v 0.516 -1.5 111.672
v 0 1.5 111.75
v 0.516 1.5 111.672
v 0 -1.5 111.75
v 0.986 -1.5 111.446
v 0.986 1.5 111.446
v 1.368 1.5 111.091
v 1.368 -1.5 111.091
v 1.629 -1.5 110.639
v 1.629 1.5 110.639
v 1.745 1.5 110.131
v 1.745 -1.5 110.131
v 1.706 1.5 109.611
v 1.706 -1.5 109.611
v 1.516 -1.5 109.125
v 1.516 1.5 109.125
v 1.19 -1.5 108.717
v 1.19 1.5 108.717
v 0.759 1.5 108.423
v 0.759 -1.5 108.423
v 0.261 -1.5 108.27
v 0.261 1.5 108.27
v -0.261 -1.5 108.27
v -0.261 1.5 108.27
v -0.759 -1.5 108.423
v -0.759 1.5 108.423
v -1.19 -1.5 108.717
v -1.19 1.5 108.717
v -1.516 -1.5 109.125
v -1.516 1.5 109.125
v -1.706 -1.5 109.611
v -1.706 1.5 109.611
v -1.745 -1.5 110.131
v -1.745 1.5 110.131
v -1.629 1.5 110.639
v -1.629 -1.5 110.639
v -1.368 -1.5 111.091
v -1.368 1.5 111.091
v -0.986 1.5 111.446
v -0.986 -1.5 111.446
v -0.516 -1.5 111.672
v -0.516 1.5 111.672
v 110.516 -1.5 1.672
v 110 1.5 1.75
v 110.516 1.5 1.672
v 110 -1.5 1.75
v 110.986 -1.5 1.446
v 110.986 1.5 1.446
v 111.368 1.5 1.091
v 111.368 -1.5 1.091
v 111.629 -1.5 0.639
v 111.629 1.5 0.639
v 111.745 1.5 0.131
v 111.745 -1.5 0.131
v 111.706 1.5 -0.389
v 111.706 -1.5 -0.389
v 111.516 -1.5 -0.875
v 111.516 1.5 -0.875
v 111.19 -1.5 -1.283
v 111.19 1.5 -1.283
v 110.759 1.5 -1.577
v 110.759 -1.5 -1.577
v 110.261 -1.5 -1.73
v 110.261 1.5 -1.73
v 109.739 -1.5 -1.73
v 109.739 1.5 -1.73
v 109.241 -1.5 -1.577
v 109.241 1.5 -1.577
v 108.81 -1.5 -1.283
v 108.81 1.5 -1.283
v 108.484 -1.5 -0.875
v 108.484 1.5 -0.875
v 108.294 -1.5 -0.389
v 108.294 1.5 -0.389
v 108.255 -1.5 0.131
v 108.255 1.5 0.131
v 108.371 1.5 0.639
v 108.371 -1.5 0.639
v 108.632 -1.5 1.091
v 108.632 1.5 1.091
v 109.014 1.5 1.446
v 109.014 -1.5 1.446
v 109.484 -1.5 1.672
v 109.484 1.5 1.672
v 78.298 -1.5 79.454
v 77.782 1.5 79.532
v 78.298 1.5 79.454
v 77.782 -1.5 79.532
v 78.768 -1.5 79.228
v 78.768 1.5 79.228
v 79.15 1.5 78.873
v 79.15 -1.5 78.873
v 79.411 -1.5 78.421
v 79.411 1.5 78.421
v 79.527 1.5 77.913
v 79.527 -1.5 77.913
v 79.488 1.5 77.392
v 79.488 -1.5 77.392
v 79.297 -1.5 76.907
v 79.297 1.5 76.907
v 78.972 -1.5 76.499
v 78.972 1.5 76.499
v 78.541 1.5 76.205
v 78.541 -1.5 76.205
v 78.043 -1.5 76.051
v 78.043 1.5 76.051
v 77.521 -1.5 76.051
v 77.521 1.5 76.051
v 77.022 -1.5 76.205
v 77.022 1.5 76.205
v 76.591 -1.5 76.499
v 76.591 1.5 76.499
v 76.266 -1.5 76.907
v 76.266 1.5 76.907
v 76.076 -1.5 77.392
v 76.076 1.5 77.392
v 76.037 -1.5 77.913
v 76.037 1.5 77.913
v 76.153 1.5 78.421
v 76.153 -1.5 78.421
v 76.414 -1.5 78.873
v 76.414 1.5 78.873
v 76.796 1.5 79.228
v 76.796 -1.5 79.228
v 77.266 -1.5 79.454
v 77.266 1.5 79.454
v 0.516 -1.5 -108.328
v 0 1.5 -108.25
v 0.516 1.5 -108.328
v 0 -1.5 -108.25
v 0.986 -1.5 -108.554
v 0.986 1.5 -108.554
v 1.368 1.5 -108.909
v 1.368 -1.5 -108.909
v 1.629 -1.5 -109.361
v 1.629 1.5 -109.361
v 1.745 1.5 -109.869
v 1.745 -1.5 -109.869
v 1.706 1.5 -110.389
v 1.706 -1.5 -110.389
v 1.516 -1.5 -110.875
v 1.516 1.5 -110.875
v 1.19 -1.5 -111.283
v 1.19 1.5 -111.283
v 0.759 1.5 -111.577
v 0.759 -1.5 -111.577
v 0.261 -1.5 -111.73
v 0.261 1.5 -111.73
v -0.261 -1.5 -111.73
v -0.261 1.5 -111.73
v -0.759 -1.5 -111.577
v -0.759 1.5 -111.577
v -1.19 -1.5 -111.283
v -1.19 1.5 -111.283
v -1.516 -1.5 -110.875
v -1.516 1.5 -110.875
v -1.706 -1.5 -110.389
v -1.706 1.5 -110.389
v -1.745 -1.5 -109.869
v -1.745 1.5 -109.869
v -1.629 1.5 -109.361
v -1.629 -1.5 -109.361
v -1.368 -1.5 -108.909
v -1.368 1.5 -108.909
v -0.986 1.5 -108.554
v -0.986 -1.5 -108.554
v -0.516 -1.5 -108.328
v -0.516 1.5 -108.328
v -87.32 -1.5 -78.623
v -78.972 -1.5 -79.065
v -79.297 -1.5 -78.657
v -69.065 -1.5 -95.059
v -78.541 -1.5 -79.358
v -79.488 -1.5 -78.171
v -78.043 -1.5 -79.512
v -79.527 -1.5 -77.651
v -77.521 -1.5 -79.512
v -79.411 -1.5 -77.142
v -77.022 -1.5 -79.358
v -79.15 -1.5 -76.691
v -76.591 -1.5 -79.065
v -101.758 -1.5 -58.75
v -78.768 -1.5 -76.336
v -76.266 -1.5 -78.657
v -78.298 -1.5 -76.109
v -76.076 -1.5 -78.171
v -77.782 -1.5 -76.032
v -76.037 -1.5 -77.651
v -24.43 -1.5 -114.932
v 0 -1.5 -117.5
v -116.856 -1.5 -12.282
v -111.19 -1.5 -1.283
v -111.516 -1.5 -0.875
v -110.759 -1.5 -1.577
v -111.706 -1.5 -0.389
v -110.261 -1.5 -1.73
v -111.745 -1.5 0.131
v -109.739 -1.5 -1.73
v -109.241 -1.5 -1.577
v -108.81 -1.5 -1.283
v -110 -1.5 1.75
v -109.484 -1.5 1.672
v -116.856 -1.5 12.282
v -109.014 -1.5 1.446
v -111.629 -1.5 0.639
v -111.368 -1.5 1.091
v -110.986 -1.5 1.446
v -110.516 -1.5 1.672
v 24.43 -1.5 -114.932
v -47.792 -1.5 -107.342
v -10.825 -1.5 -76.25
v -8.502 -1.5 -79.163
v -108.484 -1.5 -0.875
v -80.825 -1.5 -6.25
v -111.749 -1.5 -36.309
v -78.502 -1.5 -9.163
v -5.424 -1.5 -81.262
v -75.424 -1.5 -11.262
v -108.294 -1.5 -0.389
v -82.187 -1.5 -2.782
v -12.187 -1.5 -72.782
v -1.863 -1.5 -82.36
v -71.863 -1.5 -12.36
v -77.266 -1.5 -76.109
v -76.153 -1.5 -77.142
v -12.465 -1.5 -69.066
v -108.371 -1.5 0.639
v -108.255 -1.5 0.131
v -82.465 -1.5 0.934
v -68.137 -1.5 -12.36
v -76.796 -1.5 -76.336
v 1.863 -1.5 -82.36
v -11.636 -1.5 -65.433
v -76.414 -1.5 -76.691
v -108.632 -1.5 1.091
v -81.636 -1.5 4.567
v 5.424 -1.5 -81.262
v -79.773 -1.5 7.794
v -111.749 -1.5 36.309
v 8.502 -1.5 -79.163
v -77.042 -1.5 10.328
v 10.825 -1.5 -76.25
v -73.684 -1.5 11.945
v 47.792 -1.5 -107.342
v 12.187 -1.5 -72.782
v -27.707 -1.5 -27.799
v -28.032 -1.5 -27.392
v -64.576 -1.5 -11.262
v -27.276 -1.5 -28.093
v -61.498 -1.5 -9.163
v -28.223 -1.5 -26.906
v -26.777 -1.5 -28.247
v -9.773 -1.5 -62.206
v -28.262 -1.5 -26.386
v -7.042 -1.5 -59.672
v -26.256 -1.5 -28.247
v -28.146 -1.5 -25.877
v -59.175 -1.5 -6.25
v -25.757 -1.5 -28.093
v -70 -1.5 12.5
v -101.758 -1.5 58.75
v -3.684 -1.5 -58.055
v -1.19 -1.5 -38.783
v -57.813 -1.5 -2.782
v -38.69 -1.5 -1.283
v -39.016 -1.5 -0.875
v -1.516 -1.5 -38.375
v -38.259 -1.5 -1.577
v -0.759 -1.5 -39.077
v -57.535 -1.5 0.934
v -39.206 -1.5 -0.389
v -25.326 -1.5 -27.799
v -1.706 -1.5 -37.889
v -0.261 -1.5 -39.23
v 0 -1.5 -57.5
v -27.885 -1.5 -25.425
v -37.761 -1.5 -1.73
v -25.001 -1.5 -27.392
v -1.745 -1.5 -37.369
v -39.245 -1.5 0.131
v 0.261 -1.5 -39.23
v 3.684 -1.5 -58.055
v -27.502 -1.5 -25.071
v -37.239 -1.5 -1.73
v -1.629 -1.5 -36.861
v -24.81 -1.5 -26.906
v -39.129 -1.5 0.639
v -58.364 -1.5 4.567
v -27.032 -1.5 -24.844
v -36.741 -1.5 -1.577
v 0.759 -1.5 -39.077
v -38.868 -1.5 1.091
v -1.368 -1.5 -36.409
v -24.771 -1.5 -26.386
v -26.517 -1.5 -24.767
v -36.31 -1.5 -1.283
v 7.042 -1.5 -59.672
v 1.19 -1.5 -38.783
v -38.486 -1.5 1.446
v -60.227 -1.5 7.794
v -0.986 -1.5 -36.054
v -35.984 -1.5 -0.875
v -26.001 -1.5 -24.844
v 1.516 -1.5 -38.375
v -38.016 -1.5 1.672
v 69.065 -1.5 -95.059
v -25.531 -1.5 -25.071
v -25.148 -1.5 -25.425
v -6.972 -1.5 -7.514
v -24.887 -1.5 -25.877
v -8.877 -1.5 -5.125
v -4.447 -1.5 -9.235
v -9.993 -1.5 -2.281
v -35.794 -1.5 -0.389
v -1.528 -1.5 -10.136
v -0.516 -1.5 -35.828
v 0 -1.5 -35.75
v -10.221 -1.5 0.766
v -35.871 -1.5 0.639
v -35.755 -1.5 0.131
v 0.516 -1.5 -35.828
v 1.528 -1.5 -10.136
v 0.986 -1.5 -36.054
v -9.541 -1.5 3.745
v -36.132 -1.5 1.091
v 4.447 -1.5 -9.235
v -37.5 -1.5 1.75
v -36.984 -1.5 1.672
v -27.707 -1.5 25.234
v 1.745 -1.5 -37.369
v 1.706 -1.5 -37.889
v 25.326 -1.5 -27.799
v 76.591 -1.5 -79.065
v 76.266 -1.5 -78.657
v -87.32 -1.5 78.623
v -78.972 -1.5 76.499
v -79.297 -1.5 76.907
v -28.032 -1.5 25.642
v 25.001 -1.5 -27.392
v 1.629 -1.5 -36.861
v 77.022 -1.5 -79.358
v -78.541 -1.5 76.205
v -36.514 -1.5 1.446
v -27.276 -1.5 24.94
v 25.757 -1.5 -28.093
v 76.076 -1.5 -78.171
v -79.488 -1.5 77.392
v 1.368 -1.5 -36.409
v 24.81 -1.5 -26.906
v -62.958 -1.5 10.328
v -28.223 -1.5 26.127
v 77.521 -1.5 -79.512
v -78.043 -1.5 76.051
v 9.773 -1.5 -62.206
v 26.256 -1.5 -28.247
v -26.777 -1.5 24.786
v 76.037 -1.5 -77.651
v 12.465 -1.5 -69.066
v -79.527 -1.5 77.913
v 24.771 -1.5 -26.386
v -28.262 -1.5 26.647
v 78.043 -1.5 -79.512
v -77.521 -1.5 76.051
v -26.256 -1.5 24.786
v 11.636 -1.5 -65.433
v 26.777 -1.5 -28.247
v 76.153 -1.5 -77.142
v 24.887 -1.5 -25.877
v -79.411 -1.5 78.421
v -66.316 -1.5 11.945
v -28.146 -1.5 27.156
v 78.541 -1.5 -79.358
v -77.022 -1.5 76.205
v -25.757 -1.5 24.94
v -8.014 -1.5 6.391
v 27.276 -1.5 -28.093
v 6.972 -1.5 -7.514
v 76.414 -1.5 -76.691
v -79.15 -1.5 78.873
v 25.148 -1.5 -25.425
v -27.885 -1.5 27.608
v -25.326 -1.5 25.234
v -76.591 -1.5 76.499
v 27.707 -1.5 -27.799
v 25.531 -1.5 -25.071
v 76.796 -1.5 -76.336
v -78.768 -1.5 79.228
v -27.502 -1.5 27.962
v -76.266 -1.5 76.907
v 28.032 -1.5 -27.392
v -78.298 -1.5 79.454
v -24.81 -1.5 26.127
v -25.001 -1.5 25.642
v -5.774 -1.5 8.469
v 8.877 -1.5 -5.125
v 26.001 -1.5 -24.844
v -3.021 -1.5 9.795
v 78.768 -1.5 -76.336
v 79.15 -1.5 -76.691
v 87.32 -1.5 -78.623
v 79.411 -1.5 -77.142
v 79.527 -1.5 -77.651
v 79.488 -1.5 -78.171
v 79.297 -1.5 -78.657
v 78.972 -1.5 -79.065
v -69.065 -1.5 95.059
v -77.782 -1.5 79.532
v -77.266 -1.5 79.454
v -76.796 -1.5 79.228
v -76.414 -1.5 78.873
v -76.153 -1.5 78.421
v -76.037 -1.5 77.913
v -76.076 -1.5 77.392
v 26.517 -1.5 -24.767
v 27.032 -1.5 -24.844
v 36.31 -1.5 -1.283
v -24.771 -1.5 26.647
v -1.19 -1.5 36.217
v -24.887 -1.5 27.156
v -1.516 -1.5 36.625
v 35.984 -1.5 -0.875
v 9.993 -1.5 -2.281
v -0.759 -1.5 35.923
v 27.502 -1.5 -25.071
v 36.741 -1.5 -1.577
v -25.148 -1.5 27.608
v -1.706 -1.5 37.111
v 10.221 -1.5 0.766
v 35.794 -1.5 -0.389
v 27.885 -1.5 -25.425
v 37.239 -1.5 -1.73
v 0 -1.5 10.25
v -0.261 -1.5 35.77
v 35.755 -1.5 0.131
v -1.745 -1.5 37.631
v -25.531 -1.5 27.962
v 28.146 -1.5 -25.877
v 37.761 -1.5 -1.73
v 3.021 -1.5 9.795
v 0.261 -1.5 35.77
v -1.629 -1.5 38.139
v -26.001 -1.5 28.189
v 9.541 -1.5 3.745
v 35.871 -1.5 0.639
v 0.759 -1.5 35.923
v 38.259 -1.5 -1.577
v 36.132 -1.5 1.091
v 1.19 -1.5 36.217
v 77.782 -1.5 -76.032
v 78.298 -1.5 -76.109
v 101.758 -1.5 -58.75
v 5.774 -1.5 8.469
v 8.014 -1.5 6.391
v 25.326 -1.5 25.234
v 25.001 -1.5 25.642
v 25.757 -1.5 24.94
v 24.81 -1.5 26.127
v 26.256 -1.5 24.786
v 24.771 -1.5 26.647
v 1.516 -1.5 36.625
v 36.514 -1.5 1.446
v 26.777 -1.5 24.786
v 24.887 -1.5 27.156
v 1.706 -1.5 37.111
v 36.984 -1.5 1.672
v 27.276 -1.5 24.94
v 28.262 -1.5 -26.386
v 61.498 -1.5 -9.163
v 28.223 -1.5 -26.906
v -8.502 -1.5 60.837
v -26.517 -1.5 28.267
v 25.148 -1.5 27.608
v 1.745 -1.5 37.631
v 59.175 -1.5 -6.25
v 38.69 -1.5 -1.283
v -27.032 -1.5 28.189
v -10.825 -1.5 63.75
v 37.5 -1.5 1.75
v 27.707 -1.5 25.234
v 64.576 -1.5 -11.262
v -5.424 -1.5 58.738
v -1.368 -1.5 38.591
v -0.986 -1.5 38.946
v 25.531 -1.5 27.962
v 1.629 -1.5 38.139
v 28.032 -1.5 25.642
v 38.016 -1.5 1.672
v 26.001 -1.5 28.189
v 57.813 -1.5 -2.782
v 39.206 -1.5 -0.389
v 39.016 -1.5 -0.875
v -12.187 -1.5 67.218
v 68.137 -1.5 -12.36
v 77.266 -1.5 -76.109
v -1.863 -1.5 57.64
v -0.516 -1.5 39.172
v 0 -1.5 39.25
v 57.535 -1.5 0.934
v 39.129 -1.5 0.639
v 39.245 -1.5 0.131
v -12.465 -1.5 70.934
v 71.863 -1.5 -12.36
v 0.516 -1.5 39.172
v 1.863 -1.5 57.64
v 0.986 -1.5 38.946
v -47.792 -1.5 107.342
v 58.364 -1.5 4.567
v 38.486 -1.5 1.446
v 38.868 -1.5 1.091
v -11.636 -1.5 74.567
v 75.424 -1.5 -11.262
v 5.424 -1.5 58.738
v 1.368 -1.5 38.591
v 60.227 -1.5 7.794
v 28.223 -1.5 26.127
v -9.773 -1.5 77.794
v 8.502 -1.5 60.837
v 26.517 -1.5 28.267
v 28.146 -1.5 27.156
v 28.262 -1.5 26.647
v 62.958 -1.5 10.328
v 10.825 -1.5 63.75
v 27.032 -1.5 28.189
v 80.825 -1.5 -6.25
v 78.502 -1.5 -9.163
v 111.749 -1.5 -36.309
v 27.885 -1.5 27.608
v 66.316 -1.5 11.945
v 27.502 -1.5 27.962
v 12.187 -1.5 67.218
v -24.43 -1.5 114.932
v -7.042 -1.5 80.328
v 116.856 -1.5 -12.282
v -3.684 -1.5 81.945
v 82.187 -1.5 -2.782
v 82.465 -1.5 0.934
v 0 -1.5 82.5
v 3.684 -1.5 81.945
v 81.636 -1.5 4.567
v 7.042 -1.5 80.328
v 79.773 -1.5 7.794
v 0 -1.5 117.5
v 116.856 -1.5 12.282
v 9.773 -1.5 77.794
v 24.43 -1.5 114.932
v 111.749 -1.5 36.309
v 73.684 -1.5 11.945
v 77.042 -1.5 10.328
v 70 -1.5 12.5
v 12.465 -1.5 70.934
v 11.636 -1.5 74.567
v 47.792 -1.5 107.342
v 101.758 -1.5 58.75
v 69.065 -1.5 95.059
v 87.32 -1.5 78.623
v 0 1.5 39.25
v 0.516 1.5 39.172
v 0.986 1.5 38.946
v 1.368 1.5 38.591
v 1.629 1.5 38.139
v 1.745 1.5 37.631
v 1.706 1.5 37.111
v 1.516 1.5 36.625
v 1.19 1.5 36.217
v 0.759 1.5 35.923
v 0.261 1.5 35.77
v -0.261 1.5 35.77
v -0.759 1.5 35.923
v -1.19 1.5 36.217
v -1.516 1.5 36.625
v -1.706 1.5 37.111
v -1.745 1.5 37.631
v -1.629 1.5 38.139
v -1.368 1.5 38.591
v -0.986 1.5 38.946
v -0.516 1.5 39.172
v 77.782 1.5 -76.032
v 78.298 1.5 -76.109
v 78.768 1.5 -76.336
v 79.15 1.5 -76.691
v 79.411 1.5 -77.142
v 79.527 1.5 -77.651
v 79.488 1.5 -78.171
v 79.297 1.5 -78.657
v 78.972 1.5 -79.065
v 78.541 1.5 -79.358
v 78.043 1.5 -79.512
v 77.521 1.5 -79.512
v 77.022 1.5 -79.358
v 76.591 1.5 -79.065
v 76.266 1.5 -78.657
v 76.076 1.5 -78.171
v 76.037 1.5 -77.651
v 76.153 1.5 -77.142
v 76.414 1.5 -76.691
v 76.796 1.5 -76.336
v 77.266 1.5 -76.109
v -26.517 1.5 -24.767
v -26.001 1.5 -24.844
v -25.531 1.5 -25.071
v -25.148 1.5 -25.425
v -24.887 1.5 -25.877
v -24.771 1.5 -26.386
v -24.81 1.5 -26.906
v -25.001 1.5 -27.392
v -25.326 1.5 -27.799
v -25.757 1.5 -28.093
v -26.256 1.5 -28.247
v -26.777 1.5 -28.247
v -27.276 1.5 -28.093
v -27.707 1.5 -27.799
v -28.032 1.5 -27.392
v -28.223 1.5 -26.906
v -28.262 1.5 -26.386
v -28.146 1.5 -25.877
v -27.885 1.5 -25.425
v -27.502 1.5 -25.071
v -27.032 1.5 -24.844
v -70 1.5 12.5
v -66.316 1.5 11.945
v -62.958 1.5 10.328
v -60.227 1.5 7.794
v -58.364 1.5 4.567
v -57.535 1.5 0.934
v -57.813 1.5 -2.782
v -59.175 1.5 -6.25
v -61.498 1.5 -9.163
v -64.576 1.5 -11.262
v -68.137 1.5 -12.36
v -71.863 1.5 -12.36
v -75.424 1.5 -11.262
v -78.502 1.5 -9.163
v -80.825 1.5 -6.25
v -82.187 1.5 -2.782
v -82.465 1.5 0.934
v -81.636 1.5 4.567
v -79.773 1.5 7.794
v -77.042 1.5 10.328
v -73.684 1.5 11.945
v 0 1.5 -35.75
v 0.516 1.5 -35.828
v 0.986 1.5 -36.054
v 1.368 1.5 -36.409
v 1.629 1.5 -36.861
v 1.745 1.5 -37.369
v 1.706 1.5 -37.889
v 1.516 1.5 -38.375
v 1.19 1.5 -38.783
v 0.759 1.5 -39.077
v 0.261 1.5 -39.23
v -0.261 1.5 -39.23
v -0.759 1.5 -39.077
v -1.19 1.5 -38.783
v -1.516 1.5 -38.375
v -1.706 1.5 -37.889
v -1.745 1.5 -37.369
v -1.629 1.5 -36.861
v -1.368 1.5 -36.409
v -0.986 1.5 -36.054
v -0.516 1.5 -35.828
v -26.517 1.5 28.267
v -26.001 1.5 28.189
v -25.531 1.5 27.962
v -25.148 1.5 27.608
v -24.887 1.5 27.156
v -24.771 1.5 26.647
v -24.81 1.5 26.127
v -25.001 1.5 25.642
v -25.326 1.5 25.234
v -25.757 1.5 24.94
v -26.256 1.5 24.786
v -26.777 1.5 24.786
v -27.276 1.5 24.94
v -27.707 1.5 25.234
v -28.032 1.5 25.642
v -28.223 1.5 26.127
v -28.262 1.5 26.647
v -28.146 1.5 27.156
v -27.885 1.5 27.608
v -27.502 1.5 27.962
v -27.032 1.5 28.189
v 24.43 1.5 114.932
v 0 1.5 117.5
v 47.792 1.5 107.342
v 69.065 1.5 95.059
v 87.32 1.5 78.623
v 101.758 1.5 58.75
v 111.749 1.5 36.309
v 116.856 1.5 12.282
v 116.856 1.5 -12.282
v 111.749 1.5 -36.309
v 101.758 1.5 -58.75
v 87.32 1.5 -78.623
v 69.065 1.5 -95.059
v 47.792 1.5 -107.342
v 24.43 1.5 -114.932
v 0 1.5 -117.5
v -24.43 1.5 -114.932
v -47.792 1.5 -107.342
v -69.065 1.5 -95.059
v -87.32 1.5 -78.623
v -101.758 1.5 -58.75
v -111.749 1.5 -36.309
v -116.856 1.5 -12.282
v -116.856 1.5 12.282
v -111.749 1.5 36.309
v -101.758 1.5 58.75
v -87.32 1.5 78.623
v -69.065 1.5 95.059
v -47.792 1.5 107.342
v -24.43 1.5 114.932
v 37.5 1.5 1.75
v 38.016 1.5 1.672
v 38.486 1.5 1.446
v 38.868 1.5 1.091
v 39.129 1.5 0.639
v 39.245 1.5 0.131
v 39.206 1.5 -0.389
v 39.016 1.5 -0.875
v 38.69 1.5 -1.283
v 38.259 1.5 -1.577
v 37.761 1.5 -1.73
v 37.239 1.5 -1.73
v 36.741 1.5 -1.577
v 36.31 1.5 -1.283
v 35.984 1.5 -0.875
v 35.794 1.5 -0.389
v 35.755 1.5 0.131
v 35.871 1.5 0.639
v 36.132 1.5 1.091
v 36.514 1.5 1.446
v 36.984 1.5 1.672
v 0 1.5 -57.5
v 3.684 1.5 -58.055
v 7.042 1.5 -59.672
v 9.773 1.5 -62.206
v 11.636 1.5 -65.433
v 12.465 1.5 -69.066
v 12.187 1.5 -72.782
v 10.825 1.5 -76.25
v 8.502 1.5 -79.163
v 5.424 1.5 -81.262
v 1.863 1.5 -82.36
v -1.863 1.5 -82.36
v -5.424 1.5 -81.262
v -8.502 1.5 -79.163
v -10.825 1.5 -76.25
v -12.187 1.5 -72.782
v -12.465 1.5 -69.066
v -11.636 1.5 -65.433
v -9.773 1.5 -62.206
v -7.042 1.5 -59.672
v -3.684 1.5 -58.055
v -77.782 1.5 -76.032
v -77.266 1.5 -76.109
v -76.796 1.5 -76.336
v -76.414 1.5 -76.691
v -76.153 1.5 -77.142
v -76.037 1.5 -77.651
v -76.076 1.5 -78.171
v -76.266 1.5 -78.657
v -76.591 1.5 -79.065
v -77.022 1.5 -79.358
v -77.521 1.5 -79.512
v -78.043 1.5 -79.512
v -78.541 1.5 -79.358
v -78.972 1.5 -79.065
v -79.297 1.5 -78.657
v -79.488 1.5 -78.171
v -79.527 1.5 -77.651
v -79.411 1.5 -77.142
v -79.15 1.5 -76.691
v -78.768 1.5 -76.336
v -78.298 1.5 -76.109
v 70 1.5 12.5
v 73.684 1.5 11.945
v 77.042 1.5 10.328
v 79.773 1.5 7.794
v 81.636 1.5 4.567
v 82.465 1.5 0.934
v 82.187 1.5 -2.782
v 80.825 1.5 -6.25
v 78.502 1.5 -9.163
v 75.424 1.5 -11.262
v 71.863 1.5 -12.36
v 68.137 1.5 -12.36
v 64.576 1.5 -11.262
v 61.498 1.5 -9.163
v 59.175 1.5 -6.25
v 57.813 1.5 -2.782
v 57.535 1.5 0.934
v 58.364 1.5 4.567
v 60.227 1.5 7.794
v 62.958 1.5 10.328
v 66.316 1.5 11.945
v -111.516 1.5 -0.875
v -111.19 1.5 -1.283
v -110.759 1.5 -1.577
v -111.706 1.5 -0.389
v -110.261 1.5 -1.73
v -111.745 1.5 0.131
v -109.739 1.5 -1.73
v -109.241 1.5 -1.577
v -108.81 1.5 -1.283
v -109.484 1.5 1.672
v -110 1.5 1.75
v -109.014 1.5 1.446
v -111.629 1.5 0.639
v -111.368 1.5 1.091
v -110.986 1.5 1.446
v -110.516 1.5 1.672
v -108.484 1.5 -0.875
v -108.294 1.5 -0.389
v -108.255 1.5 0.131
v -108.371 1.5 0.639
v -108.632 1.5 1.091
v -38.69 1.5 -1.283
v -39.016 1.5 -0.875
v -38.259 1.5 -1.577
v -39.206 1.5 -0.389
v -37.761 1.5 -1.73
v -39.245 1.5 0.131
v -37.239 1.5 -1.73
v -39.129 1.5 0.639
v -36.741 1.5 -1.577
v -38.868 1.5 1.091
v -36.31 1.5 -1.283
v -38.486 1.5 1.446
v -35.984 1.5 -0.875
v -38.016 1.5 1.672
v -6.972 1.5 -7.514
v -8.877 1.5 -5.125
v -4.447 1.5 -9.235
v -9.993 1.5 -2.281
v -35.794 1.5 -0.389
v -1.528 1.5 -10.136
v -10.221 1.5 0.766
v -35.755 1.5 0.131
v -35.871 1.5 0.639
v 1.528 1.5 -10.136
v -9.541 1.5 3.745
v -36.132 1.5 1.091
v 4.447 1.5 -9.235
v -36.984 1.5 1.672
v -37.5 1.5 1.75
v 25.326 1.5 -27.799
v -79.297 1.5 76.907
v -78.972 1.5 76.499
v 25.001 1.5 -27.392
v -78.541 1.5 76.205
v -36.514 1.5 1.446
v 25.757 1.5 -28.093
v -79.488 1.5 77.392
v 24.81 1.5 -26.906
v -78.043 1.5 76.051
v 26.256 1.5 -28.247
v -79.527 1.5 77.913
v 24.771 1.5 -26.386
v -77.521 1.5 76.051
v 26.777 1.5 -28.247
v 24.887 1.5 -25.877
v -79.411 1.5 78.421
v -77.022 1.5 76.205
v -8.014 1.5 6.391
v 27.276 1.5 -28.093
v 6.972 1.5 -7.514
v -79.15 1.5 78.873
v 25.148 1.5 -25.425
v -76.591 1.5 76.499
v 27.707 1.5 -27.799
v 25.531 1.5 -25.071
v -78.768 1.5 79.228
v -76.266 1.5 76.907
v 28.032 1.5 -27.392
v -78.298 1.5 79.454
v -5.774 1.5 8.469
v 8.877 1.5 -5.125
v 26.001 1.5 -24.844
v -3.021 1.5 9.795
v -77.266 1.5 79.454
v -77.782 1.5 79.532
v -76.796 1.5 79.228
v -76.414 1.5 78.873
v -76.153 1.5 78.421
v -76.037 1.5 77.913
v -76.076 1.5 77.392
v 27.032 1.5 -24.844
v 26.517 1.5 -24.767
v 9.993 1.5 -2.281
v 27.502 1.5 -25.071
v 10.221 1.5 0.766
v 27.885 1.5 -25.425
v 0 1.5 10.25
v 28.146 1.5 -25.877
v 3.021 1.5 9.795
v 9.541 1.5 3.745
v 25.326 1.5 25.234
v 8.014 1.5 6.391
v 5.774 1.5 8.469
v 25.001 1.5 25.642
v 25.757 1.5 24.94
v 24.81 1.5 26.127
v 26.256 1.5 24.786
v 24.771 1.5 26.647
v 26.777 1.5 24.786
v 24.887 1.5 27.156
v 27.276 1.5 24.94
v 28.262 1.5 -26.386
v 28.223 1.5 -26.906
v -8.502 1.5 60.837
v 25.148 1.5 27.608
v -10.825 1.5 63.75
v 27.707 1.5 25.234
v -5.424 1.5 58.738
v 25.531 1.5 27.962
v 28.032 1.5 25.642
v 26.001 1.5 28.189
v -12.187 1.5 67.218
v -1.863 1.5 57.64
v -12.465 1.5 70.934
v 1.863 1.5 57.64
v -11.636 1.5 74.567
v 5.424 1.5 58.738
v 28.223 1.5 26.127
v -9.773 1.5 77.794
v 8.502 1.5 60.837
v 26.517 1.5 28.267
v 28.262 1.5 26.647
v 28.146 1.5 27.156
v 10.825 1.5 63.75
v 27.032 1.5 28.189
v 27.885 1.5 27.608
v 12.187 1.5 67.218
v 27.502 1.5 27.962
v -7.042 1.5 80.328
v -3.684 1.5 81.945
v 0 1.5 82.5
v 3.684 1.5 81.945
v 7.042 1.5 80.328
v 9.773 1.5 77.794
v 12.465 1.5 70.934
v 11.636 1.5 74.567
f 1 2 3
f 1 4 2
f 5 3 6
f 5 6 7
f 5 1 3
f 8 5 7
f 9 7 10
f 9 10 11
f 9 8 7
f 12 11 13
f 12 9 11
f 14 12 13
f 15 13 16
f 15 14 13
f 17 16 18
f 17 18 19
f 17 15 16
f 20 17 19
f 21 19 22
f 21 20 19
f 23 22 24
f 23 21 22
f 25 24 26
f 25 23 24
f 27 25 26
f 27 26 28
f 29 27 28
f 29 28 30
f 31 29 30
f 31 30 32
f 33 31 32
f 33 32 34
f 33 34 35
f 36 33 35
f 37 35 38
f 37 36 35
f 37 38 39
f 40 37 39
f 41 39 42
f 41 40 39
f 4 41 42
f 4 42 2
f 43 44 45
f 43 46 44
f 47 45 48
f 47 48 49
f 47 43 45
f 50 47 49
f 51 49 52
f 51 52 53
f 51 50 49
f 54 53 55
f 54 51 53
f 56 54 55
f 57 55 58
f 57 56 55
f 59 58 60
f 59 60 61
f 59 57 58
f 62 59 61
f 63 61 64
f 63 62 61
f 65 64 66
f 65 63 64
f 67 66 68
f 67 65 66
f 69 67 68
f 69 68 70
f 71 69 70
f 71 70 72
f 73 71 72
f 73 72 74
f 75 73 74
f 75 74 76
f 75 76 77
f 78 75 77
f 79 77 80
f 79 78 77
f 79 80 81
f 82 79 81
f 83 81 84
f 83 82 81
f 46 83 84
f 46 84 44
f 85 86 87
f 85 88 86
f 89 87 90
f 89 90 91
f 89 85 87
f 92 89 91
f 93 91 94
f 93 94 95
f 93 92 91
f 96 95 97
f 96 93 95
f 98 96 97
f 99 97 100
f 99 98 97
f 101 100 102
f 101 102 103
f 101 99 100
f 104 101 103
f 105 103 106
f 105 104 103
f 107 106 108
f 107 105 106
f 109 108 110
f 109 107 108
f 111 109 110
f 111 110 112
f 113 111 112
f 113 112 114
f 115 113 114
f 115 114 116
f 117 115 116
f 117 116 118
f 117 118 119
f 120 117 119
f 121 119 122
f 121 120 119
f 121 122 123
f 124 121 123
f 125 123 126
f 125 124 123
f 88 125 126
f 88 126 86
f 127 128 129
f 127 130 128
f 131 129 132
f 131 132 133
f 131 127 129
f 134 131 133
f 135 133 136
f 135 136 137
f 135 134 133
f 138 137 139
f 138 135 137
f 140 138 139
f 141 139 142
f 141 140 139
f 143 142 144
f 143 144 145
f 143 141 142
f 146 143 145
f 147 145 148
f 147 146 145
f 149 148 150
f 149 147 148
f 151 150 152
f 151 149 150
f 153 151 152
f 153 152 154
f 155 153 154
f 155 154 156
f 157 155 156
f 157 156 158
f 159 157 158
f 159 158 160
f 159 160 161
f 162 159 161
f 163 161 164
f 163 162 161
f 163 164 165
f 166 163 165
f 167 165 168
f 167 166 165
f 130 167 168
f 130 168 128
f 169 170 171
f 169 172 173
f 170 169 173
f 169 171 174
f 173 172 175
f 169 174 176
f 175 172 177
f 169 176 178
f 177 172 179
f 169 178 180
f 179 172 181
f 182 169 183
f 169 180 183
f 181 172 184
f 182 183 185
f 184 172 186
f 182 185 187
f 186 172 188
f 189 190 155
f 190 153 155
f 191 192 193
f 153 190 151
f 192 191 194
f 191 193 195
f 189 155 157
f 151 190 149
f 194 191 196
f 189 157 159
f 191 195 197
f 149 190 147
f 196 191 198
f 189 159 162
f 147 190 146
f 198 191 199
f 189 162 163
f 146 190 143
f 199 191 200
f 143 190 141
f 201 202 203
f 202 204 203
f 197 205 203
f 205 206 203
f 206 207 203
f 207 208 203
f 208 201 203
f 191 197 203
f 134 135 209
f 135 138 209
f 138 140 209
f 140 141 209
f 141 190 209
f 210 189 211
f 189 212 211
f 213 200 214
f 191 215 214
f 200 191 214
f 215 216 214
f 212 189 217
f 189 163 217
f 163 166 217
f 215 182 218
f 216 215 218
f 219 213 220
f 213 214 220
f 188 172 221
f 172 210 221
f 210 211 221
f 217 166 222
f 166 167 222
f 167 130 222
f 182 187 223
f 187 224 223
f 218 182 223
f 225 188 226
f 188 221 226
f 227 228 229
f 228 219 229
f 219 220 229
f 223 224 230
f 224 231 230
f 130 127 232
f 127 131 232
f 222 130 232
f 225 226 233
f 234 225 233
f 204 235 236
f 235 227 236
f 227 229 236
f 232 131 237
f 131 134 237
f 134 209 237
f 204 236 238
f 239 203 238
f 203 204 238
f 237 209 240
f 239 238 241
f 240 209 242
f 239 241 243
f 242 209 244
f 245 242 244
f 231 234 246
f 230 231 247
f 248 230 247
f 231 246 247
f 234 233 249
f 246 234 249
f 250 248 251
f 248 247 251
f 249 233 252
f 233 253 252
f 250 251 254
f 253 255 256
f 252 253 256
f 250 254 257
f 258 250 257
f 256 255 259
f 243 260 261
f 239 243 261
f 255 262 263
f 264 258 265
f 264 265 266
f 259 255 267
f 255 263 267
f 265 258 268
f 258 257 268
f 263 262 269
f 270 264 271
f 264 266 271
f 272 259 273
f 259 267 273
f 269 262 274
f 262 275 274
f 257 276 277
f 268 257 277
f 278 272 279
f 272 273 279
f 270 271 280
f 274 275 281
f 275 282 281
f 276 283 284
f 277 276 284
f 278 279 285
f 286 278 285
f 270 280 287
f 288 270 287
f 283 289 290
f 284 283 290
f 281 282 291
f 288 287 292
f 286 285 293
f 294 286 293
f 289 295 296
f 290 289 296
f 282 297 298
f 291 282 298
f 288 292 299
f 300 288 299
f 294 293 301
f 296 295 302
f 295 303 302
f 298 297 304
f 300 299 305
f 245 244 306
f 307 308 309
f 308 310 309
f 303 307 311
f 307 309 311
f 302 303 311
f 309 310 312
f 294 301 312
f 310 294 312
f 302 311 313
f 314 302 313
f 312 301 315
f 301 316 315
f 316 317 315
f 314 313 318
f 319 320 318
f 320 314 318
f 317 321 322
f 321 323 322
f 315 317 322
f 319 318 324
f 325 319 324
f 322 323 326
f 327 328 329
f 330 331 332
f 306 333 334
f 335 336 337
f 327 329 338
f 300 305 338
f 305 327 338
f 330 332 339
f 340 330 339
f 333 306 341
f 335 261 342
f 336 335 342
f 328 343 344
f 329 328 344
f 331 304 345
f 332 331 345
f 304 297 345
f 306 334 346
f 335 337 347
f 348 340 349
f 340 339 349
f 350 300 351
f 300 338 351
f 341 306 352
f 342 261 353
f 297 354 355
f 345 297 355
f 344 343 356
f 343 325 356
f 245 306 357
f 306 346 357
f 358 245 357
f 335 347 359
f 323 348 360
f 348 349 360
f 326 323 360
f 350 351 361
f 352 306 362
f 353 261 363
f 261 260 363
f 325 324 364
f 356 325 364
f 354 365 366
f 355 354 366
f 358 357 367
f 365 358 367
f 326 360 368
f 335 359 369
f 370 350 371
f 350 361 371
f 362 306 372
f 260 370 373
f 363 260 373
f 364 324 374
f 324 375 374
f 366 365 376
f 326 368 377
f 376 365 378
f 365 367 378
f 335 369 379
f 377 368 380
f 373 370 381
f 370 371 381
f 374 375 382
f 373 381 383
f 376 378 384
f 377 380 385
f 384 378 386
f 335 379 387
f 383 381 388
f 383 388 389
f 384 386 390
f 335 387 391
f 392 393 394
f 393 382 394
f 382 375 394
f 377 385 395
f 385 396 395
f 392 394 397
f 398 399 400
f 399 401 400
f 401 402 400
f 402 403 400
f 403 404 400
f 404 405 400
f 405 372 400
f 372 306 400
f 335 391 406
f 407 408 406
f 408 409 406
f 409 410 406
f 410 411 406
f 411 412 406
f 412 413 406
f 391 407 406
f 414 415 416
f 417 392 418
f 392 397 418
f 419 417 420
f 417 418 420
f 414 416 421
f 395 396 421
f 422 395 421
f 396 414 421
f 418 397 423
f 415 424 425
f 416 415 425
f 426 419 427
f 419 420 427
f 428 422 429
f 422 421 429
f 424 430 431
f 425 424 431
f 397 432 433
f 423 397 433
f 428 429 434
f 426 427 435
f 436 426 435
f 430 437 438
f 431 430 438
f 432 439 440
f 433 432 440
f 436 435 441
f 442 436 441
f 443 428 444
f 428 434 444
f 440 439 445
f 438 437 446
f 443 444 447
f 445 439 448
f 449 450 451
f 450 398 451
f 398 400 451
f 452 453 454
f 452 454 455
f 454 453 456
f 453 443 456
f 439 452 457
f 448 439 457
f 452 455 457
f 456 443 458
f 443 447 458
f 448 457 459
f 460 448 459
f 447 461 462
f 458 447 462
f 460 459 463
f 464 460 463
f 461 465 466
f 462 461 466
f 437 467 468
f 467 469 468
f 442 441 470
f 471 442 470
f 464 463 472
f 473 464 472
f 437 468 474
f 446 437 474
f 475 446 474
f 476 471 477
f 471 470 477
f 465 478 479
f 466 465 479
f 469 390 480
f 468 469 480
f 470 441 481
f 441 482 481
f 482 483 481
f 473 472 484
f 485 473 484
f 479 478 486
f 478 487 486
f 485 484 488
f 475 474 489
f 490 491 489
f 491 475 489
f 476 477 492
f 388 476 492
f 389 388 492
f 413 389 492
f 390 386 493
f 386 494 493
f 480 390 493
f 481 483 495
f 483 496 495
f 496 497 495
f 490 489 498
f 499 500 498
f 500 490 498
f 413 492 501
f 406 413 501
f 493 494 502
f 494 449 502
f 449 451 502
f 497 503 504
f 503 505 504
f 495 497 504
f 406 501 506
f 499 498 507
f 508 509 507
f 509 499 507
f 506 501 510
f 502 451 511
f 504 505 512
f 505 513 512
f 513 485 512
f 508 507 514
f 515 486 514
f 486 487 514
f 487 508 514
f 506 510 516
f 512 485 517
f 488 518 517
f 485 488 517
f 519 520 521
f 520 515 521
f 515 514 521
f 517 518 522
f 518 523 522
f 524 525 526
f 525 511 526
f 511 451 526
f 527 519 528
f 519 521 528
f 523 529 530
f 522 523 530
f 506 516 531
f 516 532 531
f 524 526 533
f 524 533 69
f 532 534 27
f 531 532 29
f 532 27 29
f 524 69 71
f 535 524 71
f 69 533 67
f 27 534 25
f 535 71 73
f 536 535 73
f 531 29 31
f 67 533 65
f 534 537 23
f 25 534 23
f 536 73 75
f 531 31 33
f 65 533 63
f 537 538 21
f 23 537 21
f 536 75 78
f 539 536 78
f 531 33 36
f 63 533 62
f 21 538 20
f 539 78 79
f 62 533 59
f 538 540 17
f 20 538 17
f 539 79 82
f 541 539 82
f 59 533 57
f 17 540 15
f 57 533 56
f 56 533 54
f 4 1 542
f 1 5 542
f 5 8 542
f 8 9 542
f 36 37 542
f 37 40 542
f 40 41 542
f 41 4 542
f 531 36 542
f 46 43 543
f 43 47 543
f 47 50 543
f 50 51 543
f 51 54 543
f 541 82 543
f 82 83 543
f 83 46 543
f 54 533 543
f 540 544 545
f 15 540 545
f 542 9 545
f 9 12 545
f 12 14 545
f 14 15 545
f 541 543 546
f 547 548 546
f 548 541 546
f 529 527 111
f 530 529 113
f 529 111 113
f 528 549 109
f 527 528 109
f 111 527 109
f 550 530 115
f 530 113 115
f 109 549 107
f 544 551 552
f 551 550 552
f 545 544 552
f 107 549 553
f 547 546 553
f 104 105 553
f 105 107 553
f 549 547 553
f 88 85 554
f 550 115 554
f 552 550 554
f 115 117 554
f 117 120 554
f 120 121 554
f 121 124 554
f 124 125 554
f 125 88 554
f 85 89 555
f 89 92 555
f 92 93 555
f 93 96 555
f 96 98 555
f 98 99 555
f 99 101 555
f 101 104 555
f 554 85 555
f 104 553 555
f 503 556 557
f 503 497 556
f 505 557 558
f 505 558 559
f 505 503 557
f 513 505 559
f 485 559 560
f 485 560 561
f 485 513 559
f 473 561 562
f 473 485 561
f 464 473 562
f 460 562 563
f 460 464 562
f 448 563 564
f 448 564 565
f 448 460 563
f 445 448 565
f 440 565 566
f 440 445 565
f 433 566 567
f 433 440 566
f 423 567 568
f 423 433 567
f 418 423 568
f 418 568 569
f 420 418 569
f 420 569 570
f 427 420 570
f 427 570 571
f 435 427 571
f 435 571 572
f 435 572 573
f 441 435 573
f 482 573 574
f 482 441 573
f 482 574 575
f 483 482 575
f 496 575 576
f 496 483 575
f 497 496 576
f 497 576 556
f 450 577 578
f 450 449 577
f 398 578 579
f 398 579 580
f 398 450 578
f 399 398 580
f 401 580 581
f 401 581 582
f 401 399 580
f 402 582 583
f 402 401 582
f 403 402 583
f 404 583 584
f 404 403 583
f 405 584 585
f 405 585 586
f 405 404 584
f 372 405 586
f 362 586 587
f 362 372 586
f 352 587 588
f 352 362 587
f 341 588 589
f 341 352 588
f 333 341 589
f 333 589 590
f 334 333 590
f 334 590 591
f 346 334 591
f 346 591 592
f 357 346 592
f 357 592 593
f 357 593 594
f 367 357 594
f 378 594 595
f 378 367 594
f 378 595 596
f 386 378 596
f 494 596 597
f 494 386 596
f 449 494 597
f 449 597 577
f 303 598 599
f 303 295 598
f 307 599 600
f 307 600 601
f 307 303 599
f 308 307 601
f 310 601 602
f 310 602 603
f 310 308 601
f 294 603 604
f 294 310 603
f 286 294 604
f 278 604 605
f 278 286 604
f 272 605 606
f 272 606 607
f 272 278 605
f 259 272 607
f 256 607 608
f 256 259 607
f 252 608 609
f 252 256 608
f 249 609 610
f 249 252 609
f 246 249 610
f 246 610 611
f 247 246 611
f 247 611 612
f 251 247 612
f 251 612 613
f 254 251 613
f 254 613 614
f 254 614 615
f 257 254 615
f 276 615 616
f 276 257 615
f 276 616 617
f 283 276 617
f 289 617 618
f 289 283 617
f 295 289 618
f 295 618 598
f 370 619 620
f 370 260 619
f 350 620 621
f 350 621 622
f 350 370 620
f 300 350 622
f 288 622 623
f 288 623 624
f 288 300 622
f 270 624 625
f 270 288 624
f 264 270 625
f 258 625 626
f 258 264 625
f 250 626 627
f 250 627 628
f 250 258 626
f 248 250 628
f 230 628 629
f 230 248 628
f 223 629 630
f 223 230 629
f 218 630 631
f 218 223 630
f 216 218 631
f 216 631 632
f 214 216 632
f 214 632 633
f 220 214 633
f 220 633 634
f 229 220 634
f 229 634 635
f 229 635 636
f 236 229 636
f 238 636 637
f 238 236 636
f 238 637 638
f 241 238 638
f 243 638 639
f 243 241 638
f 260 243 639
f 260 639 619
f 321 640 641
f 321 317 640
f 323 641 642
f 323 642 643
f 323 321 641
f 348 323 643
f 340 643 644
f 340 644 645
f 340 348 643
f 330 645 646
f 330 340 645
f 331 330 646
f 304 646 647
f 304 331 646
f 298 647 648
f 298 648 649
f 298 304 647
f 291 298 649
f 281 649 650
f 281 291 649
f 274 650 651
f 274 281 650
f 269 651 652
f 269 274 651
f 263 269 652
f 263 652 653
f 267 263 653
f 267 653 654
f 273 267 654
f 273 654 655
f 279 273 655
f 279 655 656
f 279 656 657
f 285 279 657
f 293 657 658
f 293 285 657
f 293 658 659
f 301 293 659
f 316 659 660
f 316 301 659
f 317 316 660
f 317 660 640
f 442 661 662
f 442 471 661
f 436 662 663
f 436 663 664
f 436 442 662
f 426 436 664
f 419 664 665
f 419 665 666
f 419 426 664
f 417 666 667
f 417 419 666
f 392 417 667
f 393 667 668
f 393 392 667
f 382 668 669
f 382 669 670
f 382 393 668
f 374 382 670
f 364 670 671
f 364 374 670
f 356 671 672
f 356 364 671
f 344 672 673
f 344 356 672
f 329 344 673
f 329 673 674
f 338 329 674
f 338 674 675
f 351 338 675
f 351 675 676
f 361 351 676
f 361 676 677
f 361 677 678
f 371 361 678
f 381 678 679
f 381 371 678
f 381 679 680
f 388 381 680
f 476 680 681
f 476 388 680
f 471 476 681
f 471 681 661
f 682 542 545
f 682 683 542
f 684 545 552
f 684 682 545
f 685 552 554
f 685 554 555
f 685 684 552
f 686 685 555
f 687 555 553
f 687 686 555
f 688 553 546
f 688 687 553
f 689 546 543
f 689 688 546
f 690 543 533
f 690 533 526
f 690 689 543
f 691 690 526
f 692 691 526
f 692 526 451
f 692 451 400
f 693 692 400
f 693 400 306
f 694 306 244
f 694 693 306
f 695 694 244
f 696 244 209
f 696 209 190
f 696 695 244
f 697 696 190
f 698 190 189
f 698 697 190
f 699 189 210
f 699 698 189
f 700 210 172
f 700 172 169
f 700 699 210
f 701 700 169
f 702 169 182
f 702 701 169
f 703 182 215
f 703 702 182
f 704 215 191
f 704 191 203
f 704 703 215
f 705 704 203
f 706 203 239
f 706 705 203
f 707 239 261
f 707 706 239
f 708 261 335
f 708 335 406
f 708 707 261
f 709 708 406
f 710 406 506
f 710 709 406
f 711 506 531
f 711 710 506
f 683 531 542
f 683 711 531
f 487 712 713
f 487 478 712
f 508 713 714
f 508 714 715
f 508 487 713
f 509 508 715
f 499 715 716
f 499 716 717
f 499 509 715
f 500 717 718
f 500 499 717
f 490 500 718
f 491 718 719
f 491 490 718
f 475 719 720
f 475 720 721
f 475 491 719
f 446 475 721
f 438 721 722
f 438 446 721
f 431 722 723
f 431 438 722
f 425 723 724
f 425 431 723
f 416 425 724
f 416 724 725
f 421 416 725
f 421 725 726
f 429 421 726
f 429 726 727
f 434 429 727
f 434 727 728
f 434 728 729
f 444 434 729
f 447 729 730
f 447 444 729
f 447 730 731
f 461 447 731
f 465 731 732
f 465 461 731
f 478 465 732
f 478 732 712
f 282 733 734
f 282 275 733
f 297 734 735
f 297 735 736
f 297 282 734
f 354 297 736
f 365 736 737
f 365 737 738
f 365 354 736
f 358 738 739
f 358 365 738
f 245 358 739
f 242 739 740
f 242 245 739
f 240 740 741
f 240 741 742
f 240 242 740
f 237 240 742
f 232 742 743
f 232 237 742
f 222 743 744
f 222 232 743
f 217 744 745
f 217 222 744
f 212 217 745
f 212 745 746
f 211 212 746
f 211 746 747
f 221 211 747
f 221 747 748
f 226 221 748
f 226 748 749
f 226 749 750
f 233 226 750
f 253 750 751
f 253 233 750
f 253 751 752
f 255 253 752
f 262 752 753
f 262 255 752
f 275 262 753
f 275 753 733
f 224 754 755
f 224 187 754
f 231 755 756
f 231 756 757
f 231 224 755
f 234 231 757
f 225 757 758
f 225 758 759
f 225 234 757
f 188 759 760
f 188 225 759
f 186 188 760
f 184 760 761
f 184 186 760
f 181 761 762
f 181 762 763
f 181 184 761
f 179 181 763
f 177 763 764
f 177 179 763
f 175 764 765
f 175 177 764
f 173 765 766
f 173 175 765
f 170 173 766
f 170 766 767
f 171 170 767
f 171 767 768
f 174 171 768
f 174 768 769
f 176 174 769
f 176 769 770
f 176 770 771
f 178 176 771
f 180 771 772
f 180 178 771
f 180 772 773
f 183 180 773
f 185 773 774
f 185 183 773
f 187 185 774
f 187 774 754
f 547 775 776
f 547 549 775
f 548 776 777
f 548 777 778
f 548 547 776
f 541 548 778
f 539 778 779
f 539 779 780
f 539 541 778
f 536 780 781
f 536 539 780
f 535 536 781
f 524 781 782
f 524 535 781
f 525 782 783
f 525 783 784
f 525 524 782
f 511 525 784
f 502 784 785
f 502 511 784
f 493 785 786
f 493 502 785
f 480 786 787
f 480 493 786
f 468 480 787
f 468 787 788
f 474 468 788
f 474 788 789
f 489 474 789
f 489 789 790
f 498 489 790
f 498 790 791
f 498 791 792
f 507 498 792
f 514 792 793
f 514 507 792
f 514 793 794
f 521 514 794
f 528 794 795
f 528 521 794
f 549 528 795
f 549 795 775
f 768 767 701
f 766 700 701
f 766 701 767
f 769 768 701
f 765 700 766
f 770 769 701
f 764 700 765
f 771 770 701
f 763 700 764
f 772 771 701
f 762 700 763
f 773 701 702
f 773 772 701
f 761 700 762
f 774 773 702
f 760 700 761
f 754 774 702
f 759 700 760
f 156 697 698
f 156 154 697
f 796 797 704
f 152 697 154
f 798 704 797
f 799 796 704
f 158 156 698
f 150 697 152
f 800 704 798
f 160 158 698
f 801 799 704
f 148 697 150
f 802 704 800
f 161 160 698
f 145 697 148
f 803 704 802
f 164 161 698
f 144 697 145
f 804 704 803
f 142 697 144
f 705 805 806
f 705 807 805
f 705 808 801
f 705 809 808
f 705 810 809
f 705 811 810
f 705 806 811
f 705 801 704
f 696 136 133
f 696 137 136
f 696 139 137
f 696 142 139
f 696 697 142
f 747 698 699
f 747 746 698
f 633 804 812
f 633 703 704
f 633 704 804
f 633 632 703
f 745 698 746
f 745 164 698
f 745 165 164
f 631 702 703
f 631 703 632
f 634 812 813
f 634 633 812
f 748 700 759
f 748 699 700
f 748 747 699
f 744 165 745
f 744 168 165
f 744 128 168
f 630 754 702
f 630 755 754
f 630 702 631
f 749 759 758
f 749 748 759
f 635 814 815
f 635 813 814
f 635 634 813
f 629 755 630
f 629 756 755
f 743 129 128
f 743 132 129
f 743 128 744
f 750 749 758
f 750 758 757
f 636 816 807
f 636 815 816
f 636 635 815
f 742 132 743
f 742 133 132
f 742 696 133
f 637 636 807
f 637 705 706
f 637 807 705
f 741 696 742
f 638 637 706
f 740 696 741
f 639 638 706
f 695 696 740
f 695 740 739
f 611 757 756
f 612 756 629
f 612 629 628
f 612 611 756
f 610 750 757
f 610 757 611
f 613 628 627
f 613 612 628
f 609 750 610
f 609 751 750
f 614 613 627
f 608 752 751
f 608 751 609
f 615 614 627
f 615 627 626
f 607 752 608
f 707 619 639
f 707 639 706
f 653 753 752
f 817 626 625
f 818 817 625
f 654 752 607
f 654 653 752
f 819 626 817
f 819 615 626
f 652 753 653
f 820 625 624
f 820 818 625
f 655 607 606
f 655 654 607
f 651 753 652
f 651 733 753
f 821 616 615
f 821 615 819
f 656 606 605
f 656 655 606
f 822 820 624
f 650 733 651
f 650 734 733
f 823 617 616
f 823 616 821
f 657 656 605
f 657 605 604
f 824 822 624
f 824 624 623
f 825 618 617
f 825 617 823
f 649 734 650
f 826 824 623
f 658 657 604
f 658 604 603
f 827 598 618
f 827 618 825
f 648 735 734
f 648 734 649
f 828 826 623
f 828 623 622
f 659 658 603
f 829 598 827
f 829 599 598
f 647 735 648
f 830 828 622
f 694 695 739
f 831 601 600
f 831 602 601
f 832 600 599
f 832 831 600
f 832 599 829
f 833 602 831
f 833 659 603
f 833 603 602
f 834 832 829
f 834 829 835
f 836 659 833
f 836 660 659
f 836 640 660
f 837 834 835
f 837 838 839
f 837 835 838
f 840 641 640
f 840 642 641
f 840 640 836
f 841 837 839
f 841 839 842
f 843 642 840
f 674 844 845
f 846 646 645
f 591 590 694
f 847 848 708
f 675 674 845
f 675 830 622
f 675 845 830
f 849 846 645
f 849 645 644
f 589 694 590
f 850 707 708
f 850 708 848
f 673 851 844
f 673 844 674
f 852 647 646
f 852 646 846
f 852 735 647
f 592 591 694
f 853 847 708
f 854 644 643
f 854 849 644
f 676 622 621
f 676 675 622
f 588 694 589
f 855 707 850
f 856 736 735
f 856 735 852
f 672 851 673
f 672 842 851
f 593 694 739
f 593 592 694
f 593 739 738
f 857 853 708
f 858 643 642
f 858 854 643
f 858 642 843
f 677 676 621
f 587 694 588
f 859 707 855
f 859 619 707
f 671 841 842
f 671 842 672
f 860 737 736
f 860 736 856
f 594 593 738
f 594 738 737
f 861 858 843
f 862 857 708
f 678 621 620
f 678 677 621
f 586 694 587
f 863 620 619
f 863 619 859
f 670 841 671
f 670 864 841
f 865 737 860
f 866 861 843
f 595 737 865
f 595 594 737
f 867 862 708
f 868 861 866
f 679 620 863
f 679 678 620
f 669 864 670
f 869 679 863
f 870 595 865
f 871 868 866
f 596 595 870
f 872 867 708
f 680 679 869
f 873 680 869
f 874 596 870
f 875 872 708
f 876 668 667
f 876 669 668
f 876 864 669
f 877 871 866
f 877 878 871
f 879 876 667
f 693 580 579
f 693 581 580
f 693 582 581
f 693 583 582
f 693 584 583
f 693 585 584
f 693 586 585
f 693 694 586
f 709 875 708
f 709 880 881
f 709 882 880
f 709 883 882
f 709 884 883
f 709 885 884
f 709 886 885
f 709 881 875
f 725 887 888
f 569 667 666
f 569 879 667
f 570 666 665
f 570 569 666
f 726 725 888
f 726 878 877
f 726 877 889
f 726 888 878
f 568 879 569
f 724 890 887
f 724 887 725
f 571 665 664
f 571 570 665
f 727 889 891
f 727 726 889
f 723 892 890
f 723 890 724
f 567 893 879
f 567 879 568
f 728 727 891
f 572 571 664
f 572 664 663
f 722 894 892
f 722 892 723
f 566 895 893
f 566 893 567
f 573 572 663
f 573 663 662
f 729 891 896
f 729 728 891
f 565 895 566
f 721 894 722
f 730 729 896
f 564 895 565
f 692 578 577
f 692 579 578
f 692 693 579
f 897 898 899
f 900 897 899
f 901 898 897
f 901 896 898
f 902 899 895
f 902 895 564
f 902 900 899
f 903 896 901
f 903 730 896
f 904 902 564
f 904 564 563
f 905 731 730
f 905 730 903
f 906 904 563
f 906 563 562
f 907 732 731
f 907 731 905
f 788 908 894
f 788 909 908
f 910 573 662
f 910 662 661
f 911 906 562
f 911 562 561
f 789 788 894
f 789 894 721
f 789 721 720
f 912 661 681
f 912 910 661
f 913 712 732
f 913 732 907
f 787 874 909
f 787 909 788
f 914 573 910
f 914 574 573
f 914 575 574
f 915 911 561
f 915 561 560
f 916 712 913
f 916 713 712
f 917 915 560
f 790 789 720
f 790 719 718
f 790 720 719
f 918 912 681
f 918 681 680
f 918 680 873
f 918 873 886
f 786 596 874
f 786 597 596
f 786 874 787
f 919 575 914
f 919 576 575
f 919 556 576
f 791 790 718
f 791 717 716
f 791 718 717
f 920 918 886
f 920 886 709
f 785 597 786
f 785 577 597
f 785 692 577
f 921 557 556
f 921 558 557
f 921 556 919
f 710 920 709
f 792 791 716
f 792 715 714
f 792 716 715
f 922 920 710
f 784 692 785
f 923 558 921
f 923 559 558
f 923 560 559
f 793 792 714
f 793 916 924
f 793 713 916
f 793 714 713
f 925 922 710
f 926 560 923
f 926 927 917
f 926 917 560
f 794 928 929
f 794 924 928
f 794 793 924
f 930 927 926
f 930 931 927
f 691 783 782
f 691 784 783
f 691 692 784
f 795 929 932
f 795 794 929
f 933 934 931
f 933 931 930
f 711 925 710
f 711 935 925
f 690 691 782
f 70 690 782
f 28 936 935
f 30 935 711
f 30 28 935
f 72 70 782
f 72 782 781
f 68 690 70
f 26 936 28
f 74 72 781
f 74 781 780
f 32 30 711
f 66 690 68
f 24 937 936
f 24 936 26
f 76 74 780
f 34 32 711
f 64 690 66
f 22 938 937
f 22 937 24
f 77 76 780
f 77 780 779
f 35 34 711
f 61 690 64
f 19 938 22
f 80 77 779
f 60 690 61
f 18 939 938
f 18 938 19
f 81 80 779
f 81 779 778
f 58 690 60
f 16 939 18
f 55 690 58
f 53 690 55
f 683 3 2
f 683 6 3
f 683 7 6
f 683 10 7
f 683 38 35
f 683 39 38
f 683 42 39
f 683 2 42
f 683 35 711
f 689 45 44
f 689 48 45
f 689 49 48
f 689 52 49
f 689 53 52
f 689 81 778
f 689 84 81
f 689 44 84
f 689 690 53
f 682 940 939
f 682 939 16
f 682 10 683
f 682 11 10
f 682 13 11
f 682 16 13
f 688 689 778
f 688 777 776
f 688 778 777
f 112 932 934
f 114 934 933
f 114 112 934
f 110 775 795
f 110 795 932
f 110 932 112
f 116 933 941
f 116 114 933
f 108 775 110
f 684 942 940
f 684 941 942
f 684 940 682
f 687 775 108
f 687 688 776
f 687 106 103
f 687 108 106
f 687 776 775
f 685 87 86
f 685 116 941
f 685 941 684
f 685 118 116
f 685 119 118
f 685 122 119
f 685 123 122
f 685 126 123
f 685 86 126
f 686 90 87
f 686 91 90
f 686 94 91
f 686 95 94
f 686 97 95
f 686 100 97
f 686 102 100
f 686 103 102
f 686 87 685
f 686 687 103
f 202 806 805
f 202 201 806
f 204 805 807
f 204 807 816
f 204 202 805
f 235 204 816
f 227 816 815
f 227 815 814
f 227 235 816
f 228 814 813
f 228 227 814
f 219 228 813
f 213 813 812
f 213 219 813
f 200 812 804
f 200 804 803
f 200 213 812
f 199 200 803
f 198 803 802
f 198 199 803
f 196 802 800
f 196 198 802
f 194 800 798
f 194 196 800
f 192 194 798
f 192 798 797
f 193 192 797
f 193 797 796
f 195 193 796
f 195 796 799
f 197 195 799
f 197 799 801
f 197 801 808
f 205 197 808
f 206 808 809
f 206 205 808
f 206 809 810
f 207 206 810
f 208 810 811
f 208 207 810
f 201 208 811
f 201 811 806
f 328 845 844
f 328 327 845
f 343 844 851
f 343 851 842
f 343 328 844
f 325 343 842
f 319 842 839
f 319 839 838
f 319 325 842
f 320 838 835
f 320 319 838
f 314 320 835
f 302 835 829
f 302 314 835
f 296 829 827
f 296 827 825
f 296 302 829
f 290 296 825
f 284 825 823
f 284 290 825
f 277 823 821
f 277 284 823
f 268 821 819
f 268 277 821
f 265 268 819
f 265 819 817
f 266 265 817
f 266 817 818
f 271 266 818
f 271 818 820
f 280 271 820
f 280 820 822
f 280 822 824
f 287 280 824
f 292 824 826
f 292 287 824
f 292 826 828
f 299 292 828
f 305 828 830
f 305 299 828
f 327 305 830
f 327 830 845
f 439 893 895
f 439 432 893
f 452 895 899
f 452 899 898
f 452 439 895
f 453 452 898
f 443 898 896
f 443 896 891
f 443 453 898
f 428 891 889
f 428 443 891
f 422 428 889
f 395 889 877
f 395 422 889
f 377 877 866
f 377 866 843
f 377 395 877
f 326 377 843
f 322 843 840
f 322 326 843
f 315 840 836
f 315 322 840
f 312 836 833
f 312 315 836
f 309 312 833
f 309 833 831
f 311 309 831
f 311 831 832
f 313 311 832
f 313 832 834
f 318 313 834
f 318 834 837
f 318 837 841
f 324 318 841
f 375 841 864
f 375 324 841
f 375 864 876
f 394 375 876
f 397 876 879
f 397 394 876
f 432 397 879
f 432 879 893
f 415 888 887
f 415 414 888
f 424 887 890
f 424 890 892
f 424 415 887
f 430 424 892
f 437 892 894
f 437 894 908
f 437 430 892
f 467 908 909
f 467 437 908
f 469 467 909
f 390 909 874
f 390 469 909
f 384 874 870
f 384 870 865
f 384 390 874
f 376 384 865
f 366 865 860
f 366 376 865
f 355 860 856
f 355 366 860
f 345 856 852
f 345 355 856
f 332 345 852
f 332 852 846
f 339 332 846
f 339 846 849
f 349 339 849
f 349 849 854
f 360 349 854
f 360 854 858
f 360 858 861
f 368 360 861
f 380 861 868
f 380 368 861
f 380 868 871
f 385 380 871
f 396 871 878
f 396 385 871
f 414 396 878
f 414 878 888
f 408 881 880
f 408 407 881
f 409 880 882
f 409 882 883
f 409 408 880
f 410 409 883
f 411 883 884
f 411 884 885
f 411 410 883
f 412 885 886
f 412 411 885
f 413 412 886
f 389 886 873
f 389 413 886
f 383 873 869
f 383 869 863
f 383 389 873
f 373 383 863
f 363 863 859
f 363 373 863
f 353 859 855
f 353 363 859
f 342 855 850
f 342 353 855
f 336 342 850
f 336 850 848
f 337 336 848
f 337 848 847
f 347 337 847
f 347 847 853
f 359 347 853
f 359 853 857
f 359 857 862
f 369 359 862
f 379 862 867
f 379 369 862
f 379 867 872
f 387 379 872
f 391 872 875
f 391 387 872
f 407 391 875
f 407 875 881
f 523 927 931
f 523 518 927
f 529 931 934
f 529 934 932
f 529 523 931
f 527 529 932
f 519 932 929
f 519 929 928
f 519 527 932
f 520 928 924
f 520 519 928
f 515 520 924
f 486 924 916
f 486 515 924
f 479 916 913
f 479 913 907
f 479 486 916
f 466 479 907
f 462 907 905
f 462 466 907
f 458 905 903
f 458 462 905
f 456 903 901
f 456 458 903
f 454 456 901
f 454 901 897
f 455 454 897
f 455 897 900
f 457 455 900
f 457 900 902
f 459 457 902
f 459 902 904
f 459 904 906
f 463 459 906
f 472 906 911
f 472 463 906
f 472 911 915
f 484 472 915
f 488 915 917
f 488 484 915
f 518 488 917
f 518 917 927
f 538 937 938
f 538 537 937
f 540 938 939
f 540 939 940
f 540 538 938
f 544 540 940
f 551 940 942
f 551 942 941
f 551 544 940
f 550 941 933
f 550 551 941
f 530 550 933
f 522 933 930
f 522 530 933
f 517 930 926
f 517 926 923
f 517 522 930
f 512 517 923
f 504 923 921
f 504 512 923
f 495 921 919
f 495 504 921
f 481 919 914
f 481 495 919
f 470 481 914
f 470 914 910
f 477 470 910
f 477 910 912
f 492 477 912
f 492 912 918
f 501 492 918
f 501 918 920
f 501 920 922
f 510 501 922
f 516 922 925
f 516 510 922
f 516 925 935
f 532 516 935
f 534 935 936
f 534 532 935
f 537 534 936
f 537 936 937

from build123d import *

# Parameters (mm, degrees)
SKETCH1_R           = 117.5
SKETCH1_R_2         = 10.25
SKETCH1_R_3         = 12.5
SKETCH1_R_4         = 1.75
BOSS_EXTRUDE1_DEPTH = 1.5


with BuildPart() as part:
    # Sketch1 → Boss-Extrude1 (new, symmetric)
    with BuildSketch(Plane(origin=(0, 0, 0), x_dir=(1, 0, 0), z_dir=(0, 1, 0))):
        with Locations(Location((0, 0, 0), (0, 0, 270))):
            Circle(SKETCH1_R)
        with Locations(Location((0, 0, 0), (0, 0, 270))):
            Circle(SKETCH1_R_2, mode=Mode.SUBTRACT)
        with Locations(Location((0, 70, 0), (0, 0, 270))):
            Circle(SKETCH1_R_3, mode=Mode.SUBTRACT)
        with Locations(Location((70, 0, 0), (0, 0, 270))):
            Circle(SKETCH1_R_3, mode=Mode.SUBTRACT)
        with Locations(Location((0, -70, 0), (0, 0, 270))):
            Circle(SKETCH1_R_3, mode=Mode.SUBTRACT)
        with Locations(Location((-70, 0, 0), (0, 0, 270))):
            Circle(SKETCH1_R_3, mode=Mode.SUBTRACT)
        with Locations(Location((0, 110, 0), (0, 0, 270))):
            Circle(SKETCH1_R_4, mode=Mode.SUBTRACT)
        with Locations(Location((77.781745931, 77.781745931, 0), (0, 0, 270))):
            Circle(SKETCH1_R_4, mode=Mode.SUBTRACT)
        with Locations(Location((110, 0, 0), (0, 0, 270))):
            Circle(SKETCH1_R_4, mode=Mode.SUBTRACT)
        with Locations(Location((77.781745931, -77.781745931, 0), (0, 0, 270))):
            Circle(SKETCH1_R_4, mode=Mode.SUBTRACT)
        with Locations(Location((0, -110, 0), (0, 0, 270))):
            Circle(SKETCH1_R_4, mode=Mode.SUBTRACT)
        with Locations(Location((-77.781745931, -77.781745931, 0), (0, 0, 270))):
            Circle(SKETCH1_R_4, mode=Mode.SUBTRACT)
        with Locations(Location((-110, 0, 0), (0, 0, 270))):
            Circle(SKETCH1_R_4, mode=Mode.SUBTRACT)
        with Locations(Location((-77.781745931, 77.781745931, 0), (0, 0, 270))):
            Circle(SKETCH1_R_4, mode=Mode.SUBTRACT)
        with Locations(Location((0, 37.5, 0), (0, 0, 270))):
            Circle(SKETCH1_R_4, mode=Mode.SUBTRACT)
        with Locations(Location((26.516504294, 26.516504294, 0), (0, 0, 270))):
            Circle(SKETCH1_R_4, mode=Mode.SUBTRACT)
        with Locations(Location((37.5, 0, 0), (0, 0, 270))):
            Circle(SKETCH1_R_4, mode=Mode.SUBTRACT)
        with Locations(Location((26.516504294, -26.516504294, 0), (0, 0, 270))):
            Circle(SKETCH1_R_4, mode=Mode.SUBTRACT)
        with Locations(Location((0, -37.5, 0), (0, 0, 270))):
            Circle(SKETCH1_R_4, mode=Mode.SUBTRACT)
        with Locations(Location((-26.516504294, -26.516504294, 0), (0, 0, 270))):
            Circle(SKETCH1_R_4, mode=Mode.SUBTRACT)
        with Locations(Location((-37.5, 0, 0), (0, 0, 270))):
            Circle(SKETCH1_R_4, mode=Mode.SUBTRACT)
        with Locations(Location((-26.516504294, 26.516504294, 0), (0, 0, 270))):
            Circle(SKETCH1_R_4, mode=Mode.SUBTRACT)
    extrude(amount=BOSS_EXTRUDE1_DEPTH, both=True)


solid = part.part
